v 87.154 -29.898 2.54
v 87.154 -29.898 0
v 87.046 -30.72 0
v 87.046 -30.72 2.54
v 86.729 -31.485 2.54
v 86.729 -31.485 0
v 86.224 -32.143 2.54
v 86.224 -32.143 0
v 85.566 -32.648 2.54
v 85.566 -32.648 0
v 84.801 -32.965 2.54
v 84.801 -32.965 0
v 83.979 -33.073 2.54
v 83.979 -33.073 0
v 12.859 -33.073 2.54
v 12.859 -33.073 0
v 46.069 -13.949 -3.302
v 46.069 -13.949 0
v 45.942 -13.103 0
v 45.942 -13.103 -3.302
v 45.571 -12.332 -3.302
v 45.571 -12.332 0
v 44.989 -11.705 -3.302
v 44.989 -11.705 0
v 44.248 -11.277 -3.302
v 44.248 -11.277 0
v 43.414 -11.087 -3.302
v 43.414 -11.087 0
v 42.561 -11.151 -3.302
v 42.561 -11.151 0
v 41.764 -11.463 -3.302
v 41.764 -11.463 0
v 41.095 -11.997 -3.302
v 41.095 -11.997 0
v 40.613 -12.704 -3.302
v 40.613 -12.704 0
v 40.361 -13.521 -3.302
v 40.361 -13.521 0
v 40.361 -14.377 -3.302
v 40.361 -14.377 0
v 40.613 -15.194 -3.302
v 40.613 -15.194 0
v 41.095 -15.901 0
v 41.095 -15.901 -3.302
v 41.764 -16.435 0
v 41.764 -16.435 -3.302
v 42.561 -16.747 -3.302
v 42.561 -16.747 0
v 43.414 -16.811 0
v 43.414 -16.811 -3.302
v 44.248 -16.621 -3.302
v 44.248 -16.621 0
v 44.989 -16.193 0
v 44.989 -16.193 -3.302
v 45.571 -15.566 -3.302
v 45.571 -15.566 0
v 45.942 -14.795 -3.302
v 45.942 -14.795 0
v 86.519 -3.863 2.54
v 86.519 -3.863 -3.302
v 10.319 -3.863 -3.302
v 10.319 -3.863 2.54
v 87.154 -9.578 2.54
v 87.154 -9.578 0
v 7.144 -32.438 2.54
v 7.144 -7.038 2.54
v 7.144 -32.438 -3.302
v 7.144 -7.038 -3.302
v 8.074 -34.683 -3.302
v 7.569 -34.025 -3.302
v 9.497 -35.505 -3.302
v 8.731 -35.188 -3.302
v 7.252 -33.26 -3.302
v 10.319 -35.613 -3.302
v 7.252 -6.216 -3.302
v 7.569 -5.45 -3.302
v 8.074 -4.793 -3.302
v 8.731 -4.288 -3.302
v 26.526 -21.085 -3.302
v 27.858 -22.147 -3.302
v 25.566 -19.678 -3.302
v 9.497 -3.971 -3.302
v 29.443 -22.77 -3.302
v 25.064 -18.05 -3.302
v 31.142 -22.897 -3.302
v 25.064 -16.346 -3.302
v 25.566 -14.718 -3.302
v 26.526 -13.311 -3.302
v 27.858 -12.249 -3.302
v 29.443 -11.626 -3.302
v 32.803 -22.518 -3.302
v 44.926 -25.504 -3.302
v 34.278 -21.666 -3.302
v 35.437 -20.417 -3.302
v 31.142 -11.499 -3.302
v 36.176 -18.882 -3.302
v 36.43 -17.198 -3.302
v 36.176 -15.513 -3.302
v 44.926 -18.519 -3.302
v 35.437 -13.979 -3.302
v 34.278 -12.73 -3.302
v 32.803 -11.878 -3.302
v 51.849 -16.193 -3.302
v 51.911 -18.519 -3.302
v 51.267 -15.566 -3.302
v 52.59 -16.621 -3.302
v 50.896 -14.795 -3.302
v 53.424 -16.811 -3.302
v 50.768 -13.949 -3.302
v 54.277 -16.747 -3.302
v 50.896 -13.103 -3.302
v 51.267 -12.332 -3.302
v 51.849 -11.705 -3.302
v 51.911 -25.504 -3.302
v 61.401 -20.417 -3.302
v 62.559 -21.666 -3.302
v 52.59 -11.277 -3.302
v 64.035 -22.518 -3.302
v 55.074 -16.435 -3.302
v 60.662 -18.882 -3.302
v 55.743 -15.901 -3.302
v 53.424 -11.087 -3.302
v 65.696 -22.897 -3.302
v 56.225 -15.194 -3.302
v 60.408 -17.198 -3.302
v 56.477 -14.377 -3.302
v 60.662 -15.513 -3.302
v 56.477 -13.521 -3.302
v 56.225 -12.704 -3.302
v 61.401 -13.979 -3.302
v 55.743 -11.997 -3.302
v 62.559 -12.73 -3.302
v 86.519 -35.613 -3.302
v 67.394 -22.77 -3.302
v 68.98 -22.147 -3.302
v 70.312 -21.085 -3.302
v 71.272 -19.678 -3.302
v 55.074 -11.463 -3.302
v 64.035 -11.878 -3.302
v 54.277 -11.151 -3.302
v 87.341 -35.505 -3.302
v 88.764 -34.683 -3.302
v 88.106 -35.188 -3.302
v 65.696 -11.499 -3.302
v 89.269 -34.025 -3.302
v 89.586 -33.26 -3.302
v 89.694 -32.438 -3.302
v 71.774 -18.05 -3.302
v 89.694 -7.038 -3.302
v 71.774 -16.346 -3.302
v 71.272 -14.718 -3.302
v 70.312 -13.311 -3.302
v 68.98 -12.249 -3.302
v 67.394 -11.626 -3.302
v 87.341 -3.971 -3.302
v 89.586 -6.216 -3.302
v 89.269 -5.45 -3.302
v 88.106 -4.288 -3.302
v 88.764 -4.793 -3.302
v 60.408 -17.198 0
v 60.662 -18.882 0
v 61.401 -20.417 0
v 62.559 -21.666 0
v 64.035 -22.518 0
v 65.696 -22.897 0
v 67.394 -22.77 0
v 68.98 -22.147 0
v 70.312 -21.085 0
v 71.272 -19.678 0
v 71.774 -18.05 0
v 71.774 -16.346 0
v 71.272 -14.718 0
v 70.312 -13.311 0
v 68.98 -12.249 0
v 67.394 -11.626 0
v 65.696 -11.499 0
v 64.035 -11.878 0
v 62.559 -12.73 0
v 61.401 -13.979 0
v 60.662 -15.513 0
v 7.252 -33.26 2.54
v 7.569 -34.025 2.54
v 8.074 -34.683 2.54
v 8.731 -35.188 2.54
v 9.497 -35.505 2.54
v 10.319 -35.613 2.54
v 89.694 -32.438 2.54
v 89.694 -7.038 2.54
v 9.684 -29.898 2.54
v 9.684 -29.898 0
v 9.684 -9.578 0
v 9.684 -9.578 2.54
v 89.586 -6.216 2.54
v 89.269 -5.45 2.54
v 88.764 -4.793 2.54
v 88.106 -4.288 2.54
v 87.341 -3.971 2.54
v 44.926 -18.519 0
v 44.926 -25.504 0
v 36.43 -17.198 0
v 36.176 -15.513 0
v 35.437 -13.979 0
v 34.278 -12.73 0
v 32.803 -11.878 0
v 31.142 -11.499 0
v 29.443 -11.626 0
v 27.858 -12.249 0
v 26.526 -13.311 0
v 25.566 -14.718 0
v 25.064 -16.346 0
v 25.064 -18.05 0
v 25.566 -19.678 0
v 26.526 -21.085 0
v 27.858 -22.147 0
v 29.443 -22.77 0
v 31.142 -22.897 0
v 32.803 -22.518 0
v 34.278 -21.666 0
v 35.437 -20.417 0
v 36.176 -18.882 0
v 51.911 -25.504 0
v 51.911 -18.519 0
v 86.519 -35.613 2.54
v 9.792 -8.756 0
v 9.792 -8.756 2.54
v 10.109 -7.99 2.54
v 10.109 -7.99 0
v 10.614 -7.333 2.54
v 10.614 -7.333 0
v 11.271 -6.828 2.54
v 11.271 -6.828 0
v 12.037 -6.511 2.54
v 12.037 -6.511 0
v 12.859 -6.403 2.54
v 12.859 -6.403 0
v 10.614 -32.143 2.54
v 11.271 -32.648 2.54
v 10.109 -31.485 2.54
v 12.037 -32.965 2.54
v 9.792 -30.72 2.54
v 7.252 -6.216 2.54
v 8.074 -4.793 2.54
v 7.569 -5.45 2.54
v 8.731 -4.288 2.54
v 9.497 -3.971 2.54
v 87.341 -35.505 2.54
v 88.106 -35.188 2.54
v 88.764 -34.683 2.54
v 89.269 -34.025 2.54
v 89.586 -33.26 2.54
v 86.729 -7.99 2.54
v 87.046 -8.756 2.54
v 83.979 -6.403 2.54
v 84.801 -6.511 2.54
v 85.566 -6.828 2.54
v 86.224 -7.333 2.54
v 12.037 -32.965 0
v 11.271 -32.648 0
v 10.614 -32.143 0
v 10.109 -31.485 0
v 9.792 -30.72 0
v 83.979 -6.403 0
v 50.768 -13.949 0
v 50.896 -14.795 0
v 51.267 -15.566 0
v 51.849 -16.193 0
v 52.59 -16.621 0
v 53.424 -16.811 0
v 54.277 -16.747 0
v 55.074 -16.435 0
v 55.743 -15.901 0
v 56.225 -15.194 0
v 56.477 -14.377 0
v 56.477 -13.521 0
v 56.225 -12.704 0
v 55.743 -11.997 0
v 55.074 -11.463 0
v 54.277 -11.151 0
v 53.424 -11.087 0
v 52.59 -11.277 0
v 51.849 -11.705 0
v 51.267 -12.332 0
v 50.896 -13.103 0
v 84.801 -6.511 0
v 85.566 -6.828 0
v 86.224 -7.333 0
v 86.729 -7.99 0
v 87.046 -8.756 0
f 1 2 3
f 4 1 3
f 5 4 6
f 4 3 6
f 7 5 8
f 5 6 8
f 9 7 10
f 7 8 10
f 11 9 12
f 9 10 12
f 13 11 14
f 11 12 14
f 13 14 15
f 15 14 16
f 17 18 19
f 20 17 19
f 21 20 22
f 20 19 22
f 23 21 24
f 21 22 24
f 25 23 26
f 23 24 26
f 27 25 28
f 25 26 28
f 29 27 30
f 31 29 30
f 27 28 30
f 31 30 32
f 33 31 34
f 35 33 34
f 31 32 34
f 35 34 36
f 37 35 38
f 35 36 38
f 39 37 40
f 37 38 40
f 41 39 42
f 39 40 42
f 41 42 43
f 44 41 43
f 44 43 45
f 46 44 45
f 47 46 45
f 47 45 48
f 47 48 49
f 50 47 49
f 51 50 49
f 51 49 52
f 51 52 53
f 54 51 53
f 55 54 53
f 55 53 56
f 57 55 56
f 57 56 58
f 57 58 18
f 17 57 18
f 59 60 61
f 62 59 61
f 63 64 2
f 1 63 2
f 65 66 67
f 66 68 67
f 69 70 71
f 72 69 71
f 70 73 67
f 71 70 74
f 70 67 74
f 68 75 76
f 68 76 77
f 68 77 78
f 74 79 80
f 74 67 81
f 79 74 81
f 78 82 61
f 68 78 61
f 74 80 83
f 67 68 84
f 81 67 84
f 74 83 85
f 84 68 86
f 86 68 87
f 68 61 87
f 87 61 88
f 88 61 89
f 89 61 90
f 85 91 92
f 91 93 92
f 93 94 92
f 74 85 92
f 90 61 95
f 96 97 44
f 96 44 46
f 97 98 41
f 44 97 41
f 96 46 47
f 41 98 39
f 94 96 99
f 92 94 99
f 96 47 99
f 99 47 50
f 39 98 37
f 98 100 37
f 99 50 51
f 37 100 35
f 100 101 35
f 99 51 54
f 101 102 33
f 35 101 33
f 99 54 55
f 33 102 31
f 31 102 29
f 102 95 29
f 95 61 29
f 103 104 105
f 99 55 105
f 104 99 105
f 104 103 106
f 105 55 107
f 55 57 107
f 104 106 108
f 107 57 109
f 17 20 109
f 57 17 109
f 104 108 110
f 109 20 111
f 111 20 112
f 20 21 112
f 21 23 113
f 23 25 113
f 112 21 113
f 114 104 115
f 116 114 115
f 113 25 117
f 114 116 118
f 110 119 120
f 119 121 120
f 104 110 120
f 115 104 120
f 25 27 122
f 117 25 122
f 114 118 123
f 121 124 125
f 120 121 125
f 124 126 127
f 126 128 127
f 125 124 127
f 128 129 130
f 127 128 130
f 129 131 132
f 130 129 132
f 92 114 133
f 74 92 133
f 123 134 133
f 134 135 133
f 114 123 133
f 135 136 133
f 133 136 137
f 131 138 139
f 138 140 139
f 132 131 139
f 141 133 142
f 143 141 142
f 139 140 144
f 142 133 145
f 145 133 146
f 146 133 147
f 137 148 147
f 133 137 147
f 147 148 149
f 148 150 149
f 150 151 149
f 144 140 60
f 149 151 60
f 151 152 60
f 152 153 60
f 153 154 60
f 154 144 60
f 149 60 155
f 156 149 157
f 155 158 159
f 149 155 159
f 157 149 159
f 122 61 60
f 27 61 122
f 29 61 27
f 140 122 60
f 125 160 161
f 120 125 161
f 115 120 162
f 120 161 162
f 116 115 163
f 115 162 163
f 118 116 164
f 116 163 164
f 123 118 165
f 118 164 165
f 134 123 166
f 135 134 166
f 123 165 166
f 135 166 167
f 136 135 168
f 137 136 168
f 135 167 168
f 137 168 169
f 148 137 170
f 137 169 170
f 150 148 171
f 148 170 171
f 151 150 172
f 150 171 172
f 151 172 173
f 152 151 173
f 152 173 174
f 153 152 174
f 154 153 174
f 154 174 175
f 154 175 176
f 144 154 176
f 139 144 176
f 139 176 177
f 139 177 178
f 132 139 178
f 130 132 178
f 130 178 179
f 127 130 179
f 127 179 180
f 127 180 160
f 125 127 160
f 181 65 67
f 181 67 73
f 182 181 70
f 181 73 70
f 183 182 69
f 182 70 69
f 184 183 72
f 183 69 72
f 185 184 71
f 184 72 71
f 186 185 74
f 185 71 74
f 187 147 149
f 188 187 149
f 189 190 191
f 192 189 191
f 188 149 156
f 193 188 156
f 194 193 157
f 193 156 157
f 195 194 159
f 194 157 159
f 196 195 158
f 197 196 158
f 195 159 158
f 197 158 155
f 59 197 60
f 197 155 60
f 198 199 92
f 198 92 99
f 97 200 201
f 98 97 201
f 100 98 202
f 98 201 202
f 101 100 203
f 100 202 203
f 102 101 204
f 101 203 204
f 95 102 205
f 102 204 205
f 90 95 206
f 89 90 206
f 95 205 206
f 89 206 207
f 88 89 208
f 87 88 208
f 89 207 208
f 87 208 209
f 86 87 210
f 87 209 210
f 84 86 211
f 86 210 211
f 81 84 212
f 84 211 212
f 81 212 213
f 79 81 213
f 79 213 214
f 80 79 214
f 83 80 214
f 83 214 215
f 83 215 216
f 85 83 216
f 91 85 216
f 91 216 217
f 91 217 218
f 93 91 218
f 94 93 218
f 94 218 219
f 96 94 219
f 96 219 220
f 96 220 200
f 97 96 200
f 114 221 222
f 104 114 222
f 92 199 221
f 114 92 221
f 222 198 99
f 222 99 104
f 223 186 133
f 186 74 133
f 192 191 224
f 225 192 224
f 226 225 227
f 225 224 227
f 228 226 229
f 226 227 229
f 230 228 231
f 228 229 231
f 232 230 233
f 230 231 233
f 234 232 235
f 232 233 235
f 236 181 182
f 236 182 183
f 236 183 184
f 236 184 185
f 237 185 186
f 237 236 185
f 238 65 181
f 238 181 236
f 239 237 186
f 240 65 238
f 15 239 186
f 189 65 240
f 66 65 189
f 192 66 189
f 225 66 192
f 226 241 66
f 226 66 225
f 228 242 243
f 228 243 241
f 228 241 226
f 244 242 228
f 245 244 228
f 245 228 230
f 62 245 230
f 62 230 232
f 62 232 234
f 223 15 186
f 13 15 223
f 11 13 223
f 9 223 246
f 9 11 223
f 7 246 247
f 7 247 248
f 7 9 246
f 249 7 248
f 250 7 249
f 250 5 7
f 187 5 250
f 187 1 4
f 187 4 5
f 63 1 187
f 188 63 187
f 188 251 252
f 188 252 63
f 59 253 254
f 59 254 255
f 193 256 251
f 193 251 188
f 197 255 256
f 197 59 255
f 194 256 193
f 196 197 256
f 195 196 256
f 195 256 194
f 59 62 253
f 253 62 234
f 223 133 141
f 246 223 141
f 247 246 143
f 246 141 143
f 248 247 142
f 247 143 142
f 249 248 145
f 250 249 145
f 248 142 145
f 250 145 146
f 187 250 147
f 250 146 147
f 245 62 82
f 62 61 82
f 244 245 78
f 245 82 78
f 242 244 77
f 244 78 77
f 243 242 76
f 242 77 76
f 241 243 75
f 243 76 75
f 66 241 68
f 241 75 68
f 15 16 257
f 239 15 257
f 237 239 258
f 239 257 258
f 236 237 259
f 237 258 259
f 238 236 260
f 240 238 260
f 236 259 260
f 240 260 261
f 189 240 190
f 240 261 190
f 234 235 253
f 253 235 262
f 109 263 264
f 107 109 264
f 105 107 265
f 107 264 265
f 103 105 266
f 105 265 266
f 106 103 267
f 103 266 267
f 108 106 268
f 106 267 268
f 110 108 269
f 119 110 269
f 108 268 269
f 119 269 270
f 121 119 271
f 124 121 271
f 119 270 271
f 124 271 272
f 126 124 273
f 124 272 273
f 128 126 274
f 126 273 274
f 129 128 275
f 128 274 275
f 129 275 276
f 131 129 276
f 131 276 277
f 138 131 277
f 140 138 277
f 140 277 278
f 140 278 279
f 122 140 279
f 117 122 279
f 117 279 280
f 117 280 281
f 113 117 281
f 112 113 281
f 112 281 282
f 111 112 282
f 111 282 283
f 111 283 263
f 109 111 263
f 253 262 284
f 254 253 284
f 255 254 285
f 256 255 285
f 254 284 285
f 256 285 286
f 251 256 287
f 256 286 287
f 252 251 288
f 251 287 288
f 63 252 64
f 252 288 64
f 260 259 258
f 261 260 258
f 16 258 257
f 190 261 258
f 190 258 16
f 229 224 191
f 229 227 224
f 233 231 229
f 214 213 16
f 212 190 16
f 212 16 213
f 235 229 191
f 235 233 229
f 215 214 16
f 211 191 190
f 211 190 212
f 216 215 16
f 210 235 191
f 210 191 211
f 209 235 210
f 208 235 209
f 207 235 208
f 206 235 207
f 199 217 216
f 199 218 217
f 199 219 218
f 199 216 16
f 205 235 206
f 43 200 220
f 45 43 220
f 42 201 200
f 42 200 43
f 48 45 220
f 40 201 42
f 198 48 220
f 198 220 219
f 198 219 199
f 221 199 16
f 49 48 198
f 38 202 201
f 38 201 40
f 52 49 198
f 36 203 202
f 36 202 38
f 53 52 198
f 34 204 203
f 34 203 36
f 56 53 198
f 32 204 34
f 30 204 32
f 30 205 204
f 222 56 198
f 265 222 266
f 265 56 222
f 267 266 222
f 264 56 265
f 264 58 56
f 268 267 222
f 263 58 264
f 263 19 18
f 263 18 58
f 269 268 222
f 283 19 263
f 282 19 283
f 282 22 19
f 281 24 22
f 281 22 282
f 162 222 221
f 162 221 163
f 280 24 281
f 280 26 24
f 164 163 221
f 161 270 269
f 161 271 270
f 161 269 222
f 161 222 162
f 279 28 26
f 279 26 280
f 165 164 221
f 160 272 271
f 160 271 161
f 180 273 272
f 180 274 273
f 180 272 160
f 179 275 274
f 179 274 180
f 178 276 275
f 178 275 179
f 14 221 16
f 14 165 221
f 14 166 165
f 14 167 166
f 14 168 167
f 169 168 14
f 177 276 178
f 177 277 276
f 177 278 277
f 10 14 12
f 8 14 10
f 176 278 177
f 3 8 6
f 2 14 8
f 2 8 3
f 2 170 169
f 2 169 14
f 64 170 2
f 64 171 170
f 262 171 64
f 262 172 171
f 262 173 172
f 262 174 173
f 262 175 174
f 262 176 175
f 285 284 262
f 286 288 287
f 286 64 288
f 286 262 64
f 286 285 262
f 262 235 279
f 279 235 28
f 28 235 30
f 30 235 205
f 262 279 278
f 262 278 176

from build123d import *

# Parameters (mm, degrees)
F1_DEPTH = 3.302
F2_DEPTH = 2.54
F3_R     = 5.715
F3_W     = 6.985
F3_H     = 6.985
F3_R_2   = 2.8702
F4_DEPTH = 3.303


with BuildPart() as f1:
    # F0 (on Top) → F1 (new body)
    with BuildSketch(Plane.XY):
        with BuildLine():
            Line((86.51892, -3.862933), (10.31892, -3.862933))
            ThreePointArc((10.31892, -3.862933), (8.073856, -4.792869), (7.14392, -7.037933))
            Line((7.14392, -7.037933), (7.14392, -32.437933))
            ThreePointArc((7.14392, -32.437933), (8.073856, -34.682997), (10.31892, -35.612933))
            Line((10.31892, -35.612933), (86.51892, -35.612933))
            ThreePointArc((86.51892, -35.612933), (88.763984, -34.682997), (89.69392, -32.437933))
            Line((89.69392, -32.437933), (89.69392, -7.037933))
            ThreePointArc((89.69392, -7.037933), (88.763984, -4.792869), (86.51892, -3.862933))
        make_face()
        with BuildLine():
            Line((83.97892, -33.072933), (12.85892, -33.072933))
            ThreePointArc((12.85892, -33.072933), (10.613856, -32.142997), (9.68392, -29.897933))
            Line((9.68392, -29.897933), (9.68392, -9.577933))
            ThreePointArc((9.68392, -9.577933), (10.613856, -7.332869), (12.85892, -6.402933))
            Line((12.85892, -6.402933), (83.97892, -6.402933))
            ThreePointArc((83.97892, -6.402933), (86.223984, -7.332869), (87.15392, -9.577933))
            Line((87.15392, -9.577933), (87.15392, -29.897933))
            ThreePointArc((87.15392, -29.897933), (86.223984, -32.142997), (83.97892, -33.072933))
        make_face(mode=Mode.SUBTRACT)
        with BuildLine():
            ThreePointArc((9.68392, -29.897933), (10.613856, -32.142997), (12.85892, -33.072933))
            Line((12.85892, -33.072933), (83.97892, -33.072933))
            ThreePointArc((83.97892, -33.072933), (86.223984, -32.142997), (87.15392, -29.897933))
            Line((87.15392, -29.897933), (87.15392, -9.577933))
            ThreePointArc((87.15392, -9.577933), (86.223984, -7.332869), (83.97892, -6.402933))
            Line((83.97892, -6.402933), (12.85892, -6.402933))
            ThreePointArc((12.85892, -6.402933), (10.613856, -7.332869), (9.68392, -9.577933))
            Line((9.68392, -9.577933), (9.68392, -29.897933))
        make_face()
    extrude(amount=-F1_DEPTH)

    # F0 (on Top) → F2 (join)
    with BuildSketch(Plane.XY):
        with BuildLine():
            Line((86.51892, -3.862933), (10.31892, -3.862933))
            ThreePointArc((10.31892, -3.862933), (8.073856, -4.792869), (7.14392, -7.037933))
            Line((7.14392, -7.037933), (7.14392, -32.437933))
            ThreePointArc((7.14392, -32.437933), (8.073856, -34.682997), (10.31892, -35.612933))
            Line((10.31892, -35.612933), (86.51892, -35.612933))
            ThreePointArc((86.51892, -35.612933), (88.763984, -34.682997), (89.69392, -32.437933))
            Line((89.69392, -32.437933), (89.69392, -7.037933))
            ThreePointArc((89.69392, -7.037933), (88.763984, -4.792869), (86.51892, -3.862933))
        make_face()
        with BuildLine():
            Line((83.97892, -33.072933), (12.85892, -33.072933))
            ThreePointArc((12.85892, -33.072933), (10.613856, -32.142997), (9.68392, -29.897933))
            Line((9.68392, -29.897933), (9.68392, -9.577933))
            ThreePointArc((9.68392, -9.577933), (10.613856, -7.332869), (12.85892, -6.402933))
            Line((12.85892, -6.402933), (83.97892, -6.402933))
            ThreePointArc((83.97892, -6.402933), (86.223984, -7.332869), (87.15392, -9.577933))
            Line((87.15392, -9.577933), (87.15392, -29.897933))
            ThreePointArc((87.15392, -29.897933), (86.223984, -32.142997), (83.97892, -33.072933))
        make_face(mode=Mode.SUBTRACT)
    extrude(amount=F2_DEPTH)

    # F3 (on Top) → F4 (cut, through all)
    with BuildSketch(Plane.XY):
        with Locations((30.71512, -17.197933)):
            Circle(F3_R)
        with BuildLine():
            ThreePointArc((71.83772, -17.197933), (66.12272, -11.482933), (60.40772, -17.197933))
            ThreePointArc((60.40772, -17.197933), (66.12272, -22.912933), (71.83772, -17.197933))
        make_face()
        with Locations((48.41892, -22.011233)):
            Rectangle(F3_W, F3_H)
        with Locations((43.19922, -13.949079)):
            Circle(F3_R_2)
        with BuildLine():
            ThreePointArc((56.50882, -13.949079), (53.63862, -11.078879), (50.76842, -13.949079))
            ThreePointArc((50.76842, -13.949079), (53.63862, -16.819279), (56.50882, -13.949079))
        make_face()
    extrude(amount=-F4_DEPTH, mode=Mode.SUBTRACT)


solid = f1.part
